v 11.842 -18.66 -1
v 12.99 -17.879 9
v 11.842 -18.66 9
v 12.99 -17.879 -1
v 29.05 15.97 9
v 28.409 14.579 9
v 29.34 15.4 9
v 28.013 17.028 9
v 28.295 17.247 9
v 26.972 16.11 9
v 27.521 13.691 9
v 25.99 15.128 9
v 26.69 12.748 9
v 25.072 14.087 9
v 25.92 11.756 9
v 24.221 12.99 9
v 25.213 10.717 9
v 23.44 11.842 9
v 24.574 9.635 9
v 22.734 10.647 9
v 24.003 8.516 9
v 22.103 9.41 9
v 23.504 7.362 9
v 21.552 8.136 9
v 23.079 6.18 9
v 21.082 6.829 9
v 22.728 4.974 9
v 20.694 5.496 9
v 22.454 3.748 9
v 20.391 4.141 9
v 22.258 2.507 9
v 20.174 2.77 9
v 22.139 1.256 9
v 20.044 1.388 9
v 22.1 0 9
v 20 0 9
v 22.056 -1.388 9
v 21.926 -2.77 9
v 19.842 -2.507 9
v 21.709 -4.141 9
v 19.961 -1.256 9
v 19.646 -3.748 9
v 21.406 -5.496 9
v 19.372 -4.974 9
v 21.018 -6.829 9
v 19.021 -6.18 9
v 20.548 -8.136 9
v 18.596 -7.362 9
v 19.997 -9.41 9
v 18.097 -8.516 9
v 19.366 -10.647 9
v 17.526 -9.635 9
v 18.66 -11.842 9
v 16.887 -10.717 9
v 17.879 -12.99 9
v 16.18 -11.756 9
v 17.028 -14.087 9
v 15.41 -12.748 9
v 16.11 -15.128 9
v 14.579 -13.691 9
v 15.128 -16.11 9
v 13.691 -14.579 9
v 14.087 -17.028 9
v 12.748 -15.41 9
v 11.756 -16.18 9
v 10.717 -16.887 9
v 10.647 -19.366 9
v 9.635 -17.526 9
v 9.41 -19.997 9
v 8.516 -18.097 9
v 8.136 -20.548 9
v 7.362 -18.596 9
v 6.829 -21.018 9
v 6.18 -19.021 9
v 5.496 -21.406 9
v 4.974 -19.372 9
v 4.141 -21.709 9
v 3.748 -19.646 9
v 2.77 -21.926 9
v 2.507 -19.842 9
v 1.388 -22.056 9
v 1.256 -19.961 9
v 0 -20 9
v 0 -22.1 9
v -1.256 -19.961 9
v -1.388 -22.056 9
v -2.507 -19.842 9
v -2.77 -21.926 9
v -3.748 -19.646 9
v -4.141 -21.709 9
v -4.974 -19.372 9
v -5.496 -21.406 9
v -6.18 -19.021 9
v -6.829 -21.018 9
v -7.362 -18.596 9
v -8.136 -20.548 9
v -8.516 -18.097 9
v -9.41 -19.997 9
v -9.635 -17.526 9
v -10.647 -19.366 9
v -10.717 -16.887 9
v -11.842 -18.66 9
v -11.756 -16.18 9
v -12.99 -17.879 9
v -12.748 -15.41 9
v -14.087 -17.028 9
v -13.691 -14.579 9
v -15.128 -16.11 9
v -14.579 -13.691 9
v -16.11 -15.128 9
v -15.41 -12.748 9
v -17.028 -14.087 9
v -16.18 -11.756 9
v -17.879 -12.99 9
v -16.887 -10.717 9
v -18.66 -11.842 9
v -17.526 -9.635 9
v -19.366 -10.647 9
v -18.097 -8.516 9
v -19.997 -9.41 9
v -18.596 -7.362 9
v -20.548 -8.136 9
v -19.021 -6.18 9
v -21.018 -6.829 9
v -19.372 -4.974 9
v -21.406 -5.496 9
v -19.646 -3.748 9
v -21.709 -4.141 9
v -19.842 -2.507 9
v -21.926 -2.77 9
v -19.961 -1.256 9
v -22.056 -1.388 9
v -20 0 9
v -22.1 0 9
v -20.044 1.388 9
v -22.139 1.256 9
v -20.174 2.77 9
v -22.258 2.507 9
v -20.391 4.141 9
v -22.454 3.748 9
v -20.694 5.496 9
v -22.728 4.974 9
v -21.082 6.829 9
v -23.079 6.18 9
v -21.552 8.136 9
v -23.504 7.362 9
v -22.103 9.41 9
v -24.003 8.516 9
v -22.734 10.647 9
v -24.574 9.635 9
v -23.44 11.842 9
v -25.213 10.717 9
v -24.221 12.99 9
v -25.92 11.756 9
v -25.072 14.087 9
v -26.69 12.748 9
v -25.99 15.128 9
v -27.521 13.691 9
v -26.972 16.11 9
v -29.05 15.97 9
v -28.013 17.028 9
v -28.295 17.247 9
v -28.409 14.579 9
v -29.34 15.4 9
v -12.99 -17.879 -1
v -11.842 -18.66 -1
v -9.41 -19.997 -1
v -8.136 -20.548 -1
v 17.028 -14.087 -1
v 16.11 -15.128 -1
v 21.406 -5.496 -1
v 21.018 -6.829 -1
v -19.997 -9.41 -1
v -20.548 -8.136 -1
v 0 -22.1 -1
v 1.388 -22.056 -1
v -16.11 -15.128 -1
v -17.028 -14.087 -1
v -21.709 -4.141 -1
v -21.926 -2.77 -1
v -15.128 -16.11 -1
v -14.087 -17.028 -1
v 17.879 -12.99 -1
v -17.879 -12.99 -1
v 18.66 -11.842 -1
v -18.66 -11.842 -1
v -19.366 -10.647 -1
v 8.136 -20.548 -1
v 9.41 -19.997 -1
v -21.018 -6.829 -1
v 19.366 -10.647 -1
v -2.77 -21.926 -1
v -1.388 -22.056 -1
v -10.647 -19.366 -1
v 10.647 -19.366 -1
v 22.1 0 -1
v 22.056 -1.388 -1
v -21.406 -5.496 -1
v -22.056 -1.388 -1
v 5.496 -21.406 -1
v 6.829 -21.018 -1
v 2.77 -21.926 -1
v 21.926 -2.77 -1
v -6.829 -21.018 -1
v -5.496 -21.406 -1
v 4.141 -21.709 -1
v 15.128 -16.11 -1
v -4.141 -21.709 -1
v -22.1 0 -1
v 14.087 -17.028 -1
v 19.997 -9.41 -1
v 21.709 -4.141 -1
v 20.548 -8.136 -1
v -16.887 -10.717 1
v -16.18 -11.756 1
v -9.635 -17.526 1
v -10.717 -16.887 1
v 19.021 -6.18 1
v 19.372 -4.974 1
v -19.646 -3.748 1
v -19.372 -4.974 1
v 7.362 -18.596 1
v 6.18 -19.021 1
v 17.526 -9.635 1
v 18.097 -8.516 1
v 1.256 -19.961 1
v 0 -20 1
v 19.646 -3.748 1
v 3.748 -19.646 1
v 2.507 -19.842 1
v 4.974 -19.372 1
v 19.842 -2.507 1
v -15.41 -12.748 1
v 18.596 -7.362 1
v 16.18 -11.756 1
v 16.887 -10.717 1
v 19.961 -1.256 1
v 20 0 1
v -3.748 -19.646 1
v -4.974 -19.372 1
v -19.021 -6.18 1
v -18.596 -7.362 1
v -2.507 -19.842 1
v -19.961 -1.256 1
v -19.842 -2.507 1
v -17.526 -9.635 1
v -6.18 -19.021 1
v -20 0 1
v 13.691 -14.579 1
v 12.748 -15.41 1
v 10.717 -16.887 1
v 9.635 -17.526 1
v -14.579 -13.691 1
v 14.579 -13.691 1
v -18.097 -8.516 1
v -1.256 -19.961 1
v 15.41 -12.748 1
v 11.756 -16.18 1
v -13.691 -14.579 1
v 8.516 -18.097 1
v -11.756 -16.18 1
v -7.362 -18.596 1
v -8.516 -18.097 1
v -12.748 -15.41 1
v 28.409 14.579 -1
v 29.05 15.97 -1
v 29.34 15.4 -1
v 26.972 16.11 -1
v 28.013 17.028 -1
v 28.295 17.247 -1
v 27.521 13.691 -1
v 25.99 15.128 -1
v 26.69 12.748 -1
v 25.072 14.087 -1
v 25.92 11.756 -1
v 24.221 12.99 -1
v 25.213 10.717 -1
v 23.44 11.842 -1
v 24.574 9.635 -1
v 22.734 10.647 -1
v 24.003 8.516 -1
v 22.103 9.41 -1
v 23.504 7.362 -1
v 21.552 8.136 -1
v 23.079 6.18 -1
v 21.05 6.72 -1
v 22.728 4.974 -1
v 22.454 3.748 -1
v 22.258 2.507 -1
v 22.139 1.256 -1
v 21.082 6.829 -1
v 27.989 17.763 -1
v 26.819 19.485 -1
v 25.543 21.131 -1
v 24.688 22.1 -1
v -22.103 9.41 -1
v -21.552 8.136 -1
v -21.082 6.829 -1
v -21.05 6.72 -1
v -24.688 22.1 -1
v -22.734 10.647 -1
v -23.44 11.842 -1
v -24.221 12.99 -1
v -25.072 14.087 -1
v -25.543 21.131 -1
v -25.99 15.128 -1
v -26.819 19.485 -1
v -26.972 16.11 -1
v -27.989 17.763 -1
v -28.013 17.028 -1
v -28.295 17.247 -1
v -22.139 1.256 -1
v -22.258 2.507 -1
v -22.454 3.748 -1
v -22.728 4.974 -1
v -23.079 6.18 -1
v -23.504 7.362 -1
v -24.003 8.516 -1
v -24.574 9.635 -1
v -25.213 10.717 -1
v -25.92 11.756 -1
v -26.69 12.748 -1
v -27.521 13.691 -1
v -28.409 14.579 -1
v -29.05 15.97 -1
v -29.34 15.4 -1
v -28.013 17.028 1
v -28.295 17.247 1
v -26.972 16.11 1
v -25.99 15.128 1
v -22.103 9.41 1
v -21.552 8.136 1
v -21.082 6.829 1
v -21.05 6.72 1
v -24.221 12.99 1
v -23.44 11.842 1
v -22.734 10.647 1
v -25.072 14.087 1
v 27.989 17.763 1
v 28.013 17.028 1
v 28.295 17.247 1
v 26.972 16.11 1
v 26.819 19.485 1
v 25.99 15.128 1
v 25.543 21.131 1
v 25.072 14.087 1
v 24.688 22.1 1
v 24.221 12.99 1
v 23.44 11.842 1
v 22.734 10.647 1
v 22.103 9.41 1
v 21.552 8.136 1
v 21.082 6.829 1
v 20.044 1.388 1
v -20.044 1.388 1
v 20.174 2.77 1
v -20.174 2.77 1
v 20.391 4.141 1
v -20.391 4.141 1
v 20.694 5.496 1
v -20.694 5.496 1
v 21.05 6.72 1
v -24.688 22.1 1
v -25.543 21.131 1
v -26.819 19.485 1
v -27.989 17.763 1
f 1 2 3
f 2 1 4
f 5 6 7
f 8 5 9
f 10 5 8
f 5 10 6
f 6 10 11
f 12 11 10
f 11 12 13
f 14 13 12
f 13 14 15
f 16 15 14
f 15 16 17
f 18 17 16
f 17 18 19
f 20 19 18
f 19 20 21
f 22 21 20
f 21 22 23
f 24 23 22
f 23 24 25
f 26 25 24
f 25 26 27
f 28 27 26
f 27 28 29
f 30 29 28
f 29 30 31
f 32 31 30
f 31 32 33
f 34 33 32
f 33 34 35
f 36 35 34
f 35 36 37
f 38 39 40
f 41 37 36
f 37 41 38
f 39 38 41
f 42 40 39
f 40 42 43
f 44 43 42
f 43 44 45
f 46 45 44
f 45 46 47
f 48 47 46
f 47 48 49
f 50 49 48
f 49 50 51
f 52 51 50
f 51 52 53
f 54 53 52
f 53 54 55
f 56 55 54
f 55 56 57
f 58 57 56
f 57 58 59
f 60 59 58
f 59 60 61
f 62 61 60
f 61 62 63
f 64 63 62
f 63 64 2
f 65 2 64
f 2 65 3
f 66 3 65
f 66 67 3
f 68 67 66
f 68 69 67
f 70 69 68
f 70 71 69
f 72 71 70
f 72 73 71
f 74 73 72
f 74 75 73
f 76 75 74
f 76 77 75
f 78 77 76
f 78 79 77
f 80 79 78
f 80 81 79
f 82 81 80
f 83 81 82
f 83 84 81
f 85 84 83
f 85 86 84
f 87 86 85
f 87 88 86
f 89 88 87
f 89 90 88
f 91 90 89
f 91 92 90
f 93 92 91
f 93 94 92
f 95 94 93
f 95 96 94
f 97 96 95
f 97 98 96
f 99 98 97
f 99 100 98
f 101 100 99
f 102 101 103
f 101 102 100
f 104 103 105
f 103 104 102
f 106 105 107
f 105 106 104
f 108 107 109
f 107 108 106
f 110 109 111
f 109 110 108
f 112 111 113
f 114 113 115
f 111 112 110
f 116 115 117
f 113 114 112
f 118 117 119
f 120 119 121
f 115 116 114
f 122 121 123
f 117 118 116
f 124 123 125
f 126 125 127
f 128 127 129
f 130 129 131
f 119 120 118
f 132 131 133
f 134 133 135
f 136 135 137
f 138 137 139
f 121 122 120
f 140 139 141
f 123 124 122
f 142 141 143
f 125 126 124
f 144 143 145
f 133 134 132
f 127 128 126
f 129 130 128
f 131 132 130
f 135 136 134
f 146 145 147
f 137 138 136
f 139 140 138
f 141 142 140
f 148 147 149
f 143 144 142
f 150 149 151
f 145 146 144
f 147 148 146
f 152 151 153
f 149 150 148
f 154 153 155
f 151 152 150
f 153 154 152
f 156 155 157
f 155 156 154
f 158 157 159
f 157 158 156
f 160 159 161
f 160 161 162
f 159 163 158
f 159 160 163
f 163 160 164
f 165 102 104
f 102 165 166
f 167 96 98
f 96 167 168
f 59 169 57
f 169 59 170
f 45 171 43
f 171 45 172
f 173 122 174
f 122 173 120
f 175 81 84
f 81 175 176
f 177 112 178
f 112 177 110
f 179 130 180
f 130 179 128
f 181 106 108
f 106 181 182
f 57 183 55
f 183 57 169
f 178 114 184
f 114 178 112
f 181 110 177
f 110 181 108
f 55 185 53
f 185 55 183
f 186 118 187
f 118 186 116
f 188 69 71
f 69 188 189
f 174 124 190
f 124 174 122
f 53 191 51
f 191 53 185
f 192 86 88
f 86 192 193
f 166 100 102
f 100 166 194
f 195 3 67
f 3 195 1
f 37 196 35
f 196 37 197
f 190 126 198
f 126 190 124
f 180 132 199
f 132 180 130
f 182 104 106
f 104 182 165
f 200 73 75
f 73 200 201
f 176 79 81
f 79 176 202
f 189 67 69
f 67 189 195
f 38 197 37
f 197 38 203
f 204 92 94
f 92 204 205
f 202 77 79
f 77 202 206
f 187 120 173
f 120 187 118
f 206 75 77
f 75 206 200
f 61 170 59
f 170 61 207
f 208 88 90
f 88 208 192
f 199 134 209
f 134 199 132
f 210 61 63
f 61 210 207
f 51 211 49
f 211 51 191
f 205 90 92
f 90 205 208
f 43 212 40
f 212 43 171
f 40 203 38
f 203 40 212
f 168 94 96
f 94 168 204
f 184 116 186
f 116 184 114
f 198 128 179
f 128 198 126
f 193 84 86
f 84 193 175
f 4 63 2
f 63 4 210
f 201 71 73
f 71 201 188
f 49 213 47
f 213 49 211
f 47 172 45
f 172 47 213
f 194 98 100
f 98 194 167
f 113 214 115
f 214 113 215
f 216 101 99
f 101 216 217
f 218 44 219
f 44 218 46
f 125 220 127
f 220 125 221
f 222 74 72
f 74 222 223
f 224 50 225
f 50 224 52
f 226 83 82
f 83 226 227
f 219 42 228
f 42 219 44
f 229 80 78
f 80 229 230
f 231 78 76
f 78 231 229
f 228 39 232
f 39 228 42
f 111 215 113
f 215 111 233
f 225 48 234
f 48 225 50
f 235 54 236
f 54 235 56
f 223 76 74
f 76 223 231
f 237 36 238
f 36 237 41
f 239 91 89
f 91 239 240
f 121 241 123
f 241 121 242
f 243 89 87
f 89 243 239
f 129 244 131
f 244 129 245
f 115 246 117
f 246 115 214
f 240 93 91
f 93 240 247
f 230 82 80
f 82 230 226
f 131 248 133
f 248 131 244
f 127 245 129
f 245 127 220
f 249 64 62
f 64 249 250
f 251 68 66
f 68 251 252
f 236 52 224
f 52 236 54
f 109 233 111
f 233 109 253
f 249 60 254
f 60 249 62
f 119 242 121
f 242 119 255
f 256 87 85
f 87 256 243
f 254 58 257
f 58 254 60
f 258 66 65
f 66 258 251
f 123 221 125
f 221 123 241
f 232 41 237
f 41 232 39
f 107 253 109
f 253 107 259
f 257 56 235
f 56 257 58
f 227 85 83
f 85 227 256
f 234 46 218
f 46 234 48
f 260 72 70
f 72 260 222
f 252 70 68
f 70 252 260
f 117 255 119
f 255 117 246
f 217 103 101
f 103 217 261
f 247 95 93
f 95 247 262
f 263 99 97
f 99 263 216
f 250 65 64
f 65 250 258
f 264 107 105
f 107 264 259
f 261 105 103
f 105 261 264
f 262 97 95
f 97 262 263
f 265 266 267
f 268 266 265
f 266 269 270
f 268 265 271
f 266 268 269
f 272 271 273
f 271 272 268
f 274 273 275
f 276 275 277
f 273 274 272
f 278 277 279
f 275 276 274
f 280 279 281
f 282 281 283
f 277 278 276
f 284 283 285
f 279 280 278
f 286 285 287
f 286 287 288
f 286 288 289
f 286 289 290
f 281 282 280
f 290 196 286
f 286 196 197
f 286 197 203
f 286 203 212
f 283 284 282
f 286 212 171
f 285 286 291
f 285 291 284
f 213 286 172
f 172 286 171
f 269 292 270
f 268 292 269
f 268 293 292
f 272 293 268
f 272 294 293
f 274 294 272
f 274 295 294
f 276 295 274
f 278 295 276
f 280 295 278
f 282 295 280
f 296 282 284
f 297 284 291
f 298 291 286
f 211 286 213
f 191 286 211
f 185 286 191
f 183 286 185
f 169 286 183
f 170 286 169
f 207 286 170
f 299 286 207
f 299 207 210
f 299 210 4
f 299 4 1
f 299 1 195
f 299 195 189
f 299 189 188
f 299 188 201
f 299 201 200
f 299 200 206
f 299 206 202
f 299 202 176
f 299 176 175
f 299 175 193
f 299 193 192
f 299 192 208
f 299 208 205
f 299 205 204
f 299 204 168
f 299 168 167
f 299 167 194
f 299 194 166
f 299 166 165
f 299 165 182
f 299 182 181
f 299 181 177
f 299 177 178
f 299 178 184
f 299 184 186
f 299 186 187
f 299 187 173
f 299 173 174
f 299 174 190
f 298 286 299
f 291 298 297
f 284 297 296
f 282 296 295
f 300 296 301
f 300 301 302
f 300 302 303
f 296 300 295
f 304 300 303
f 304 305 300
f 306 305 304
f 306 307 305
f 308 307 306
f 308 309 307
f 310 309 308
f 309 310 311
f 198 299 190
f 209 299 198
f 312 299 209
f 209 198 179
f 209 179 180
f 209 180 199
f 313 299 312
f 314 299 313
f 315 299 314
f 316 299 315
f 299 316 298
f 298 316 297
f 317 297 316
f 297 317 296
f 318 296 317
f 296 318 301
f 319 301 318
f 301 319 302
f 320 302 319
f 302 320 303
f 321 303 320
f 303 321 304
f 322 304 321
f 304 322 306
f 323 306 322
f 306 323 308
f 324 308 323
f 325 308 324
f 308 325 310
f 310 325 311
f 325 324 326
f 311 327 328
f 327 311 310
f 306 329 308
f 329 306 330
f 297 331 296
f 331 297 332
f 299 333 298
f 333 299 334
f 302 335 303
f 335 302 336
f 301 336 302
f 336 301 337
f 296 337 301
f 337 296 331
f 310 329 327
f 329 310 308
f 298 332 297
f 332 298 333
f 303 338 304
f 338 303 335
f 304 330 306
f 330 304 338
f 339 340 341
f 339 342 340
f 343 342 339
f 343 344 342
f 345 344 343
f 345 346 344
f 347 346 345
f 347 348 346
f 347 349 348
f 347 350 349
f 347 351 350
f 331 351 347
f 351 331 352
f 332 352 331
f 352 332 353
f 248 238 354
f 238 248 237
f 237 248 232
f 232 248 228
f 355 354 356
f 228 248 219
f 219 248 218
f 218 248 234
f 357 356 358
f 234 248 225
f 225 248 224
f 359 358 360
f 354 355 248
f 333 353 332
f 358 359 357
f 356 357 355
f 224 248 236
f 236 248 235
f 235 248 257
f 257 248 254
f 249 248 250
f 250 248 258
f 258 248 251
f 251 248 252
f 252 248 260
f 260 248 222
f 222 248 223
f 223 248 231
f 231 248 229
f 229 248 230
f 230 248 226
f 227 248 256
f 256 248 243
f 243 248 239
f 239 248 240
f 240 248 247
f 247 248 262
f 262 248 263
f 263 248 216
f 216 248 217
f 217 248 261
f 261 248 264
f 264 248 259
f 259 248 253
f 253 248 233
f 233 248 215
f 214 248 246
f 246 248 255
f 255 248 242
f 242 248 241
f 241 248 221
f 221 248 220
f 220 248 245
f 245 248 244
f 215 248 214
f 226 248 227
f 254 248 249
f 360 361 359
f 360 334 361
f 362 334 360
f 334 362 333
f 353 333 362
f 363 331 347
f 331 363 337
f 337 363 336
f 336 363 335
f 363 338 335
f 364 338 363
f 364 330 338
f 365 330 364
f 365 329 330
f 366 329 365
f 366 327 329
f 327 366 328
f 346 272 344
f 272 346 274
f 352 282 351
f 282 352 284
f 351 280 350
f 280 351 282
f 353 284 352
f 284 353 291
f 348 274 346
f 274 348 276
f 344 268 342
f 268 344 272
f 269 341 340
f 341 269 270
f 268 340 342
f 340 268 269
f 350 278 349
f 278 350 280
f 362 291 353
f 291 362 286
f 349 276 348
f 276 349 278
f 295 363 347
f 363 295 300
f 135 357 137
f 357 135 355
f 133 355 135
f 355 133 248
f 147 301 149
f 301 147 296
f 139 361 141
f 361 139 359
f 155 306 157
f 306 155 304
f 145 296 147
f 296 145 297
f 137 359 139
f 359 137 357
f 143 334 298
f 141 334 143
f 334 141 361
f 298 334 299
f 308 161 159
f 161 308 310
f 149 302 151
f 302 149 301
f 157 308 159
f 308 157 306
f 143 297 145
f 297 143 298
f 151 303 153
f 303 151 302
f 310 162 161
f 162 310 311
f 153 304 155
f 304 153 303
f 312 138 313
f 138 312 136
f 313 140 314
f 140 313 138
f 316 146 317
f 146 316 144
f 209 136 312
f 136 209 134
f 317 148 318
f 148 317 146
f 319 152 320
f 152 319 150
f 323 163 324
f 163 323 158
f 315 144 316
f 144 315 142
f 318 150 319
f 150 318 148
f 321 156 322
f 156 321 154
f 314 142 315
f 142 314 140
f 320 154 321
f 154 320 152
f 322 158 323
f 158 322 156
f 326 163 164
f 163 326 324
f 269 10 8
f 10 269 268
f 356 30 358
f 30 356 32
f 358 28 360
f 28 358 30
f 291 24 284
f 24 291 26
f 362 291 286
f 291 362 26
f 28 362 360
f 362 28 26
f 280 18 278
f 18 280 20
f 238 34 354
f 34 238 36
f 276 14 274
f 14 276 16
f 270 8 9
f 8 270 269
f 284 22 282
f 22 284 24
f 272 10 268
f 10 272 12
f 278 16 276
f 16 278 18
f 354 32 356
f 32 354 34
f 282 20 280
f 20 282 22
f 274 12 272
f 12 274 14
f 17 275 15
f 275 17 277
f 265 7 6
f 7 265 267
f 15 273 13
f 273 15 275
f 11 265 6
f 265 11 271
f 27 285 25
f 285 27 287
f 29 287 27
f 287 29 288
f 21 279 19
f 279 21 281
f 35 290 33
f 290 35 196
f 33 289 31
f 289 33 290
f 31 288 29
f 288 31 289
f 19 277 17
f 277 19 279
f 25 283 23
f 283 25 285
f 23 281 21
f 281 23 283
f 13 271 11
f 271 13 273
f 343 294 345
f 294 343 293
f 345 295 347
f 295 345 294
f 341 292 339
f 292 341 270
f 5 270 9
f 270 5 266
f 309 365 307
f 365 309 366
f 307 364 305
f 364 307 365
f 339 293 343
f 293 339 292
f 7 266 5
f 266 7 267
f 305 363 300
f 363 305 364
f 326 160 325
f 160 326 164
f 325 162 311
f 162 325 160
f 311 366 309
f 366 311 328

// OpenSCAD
/* [Basic] */
// inner radius of the holder, without border
innerRadius = 20; // [0:100]

// strength of the wall
wallStrength = 2.1;

// height of the plate
plateHeight = 2; // [0:10]

// height of the wall
wallHeight = 10; // [0:100]

module unionCube(){
    translate([0,innerRadius,(plateHeight+wallHeight)/2])
        cube(size=[innerRadius*4,innerRadius*2,plateHeight*2+wallHeight], center = true);
}

module plate(){
    cylinder(plateHeight, innerRadius+wallStrength, innerRadius+wallStrength, true, $fn = 100);
}
module plateWall(){
    translate([0,0,plateHeight*2]){
        difference(){
            cylinder(wallHeight, innerRadius+wallStrength, innerRadius+wallStrength, true, $fn = 100);
            cylinder(wallHeight, innerRadius, innerRadius, true, $fn = 100);
        }
    }
}

module everything(){
    union(){
        plate();

        // halfcircle wall
        intersection(){
            plateWall();
            translate([0,-innerRadius,(plateHeight+wallHeight)/2]){
                cube(size=[innerRadius*4,innerRadius*2,plateHeight+wallHeight], center = true);
            }
        }

        // helper walls
        difference(){
            translate([0,innerRadius/2+wallStrength/2,0]){
                cube(size = [innerRadius*4,innerRadius+wallStrength,plateHeight], center = true);
            }
            union(){
                intersection(){
                    unionCube();
                    translate([-innerRadius*2-wallStrength,0,0]){
                        plate();
                    }
                }
                intersection(){
                    unionCube();
                    translate([innerRadius*2+wallStrength,0,0]){
                        plate();
                    }
                }
            }
        }

        union(){
            intersection(){
                unionCube();
                translate([-innerRadius*2-wallStrength,0,0]){
                    plateWall();
                    //plate();
                }
            }
            intersection(){
                unionCube();
                translate([innerRadius*2+wallStrength,0,0]){
                    plateWall();
                    //plate();
                }
            }
        }
    }
}

intersection(){
    everything();
    cylinder(1000, (innerRadius+wallStrength)*1.5, (innerRadius+wallStrength)*1.5, true, $fn = 100);
}
